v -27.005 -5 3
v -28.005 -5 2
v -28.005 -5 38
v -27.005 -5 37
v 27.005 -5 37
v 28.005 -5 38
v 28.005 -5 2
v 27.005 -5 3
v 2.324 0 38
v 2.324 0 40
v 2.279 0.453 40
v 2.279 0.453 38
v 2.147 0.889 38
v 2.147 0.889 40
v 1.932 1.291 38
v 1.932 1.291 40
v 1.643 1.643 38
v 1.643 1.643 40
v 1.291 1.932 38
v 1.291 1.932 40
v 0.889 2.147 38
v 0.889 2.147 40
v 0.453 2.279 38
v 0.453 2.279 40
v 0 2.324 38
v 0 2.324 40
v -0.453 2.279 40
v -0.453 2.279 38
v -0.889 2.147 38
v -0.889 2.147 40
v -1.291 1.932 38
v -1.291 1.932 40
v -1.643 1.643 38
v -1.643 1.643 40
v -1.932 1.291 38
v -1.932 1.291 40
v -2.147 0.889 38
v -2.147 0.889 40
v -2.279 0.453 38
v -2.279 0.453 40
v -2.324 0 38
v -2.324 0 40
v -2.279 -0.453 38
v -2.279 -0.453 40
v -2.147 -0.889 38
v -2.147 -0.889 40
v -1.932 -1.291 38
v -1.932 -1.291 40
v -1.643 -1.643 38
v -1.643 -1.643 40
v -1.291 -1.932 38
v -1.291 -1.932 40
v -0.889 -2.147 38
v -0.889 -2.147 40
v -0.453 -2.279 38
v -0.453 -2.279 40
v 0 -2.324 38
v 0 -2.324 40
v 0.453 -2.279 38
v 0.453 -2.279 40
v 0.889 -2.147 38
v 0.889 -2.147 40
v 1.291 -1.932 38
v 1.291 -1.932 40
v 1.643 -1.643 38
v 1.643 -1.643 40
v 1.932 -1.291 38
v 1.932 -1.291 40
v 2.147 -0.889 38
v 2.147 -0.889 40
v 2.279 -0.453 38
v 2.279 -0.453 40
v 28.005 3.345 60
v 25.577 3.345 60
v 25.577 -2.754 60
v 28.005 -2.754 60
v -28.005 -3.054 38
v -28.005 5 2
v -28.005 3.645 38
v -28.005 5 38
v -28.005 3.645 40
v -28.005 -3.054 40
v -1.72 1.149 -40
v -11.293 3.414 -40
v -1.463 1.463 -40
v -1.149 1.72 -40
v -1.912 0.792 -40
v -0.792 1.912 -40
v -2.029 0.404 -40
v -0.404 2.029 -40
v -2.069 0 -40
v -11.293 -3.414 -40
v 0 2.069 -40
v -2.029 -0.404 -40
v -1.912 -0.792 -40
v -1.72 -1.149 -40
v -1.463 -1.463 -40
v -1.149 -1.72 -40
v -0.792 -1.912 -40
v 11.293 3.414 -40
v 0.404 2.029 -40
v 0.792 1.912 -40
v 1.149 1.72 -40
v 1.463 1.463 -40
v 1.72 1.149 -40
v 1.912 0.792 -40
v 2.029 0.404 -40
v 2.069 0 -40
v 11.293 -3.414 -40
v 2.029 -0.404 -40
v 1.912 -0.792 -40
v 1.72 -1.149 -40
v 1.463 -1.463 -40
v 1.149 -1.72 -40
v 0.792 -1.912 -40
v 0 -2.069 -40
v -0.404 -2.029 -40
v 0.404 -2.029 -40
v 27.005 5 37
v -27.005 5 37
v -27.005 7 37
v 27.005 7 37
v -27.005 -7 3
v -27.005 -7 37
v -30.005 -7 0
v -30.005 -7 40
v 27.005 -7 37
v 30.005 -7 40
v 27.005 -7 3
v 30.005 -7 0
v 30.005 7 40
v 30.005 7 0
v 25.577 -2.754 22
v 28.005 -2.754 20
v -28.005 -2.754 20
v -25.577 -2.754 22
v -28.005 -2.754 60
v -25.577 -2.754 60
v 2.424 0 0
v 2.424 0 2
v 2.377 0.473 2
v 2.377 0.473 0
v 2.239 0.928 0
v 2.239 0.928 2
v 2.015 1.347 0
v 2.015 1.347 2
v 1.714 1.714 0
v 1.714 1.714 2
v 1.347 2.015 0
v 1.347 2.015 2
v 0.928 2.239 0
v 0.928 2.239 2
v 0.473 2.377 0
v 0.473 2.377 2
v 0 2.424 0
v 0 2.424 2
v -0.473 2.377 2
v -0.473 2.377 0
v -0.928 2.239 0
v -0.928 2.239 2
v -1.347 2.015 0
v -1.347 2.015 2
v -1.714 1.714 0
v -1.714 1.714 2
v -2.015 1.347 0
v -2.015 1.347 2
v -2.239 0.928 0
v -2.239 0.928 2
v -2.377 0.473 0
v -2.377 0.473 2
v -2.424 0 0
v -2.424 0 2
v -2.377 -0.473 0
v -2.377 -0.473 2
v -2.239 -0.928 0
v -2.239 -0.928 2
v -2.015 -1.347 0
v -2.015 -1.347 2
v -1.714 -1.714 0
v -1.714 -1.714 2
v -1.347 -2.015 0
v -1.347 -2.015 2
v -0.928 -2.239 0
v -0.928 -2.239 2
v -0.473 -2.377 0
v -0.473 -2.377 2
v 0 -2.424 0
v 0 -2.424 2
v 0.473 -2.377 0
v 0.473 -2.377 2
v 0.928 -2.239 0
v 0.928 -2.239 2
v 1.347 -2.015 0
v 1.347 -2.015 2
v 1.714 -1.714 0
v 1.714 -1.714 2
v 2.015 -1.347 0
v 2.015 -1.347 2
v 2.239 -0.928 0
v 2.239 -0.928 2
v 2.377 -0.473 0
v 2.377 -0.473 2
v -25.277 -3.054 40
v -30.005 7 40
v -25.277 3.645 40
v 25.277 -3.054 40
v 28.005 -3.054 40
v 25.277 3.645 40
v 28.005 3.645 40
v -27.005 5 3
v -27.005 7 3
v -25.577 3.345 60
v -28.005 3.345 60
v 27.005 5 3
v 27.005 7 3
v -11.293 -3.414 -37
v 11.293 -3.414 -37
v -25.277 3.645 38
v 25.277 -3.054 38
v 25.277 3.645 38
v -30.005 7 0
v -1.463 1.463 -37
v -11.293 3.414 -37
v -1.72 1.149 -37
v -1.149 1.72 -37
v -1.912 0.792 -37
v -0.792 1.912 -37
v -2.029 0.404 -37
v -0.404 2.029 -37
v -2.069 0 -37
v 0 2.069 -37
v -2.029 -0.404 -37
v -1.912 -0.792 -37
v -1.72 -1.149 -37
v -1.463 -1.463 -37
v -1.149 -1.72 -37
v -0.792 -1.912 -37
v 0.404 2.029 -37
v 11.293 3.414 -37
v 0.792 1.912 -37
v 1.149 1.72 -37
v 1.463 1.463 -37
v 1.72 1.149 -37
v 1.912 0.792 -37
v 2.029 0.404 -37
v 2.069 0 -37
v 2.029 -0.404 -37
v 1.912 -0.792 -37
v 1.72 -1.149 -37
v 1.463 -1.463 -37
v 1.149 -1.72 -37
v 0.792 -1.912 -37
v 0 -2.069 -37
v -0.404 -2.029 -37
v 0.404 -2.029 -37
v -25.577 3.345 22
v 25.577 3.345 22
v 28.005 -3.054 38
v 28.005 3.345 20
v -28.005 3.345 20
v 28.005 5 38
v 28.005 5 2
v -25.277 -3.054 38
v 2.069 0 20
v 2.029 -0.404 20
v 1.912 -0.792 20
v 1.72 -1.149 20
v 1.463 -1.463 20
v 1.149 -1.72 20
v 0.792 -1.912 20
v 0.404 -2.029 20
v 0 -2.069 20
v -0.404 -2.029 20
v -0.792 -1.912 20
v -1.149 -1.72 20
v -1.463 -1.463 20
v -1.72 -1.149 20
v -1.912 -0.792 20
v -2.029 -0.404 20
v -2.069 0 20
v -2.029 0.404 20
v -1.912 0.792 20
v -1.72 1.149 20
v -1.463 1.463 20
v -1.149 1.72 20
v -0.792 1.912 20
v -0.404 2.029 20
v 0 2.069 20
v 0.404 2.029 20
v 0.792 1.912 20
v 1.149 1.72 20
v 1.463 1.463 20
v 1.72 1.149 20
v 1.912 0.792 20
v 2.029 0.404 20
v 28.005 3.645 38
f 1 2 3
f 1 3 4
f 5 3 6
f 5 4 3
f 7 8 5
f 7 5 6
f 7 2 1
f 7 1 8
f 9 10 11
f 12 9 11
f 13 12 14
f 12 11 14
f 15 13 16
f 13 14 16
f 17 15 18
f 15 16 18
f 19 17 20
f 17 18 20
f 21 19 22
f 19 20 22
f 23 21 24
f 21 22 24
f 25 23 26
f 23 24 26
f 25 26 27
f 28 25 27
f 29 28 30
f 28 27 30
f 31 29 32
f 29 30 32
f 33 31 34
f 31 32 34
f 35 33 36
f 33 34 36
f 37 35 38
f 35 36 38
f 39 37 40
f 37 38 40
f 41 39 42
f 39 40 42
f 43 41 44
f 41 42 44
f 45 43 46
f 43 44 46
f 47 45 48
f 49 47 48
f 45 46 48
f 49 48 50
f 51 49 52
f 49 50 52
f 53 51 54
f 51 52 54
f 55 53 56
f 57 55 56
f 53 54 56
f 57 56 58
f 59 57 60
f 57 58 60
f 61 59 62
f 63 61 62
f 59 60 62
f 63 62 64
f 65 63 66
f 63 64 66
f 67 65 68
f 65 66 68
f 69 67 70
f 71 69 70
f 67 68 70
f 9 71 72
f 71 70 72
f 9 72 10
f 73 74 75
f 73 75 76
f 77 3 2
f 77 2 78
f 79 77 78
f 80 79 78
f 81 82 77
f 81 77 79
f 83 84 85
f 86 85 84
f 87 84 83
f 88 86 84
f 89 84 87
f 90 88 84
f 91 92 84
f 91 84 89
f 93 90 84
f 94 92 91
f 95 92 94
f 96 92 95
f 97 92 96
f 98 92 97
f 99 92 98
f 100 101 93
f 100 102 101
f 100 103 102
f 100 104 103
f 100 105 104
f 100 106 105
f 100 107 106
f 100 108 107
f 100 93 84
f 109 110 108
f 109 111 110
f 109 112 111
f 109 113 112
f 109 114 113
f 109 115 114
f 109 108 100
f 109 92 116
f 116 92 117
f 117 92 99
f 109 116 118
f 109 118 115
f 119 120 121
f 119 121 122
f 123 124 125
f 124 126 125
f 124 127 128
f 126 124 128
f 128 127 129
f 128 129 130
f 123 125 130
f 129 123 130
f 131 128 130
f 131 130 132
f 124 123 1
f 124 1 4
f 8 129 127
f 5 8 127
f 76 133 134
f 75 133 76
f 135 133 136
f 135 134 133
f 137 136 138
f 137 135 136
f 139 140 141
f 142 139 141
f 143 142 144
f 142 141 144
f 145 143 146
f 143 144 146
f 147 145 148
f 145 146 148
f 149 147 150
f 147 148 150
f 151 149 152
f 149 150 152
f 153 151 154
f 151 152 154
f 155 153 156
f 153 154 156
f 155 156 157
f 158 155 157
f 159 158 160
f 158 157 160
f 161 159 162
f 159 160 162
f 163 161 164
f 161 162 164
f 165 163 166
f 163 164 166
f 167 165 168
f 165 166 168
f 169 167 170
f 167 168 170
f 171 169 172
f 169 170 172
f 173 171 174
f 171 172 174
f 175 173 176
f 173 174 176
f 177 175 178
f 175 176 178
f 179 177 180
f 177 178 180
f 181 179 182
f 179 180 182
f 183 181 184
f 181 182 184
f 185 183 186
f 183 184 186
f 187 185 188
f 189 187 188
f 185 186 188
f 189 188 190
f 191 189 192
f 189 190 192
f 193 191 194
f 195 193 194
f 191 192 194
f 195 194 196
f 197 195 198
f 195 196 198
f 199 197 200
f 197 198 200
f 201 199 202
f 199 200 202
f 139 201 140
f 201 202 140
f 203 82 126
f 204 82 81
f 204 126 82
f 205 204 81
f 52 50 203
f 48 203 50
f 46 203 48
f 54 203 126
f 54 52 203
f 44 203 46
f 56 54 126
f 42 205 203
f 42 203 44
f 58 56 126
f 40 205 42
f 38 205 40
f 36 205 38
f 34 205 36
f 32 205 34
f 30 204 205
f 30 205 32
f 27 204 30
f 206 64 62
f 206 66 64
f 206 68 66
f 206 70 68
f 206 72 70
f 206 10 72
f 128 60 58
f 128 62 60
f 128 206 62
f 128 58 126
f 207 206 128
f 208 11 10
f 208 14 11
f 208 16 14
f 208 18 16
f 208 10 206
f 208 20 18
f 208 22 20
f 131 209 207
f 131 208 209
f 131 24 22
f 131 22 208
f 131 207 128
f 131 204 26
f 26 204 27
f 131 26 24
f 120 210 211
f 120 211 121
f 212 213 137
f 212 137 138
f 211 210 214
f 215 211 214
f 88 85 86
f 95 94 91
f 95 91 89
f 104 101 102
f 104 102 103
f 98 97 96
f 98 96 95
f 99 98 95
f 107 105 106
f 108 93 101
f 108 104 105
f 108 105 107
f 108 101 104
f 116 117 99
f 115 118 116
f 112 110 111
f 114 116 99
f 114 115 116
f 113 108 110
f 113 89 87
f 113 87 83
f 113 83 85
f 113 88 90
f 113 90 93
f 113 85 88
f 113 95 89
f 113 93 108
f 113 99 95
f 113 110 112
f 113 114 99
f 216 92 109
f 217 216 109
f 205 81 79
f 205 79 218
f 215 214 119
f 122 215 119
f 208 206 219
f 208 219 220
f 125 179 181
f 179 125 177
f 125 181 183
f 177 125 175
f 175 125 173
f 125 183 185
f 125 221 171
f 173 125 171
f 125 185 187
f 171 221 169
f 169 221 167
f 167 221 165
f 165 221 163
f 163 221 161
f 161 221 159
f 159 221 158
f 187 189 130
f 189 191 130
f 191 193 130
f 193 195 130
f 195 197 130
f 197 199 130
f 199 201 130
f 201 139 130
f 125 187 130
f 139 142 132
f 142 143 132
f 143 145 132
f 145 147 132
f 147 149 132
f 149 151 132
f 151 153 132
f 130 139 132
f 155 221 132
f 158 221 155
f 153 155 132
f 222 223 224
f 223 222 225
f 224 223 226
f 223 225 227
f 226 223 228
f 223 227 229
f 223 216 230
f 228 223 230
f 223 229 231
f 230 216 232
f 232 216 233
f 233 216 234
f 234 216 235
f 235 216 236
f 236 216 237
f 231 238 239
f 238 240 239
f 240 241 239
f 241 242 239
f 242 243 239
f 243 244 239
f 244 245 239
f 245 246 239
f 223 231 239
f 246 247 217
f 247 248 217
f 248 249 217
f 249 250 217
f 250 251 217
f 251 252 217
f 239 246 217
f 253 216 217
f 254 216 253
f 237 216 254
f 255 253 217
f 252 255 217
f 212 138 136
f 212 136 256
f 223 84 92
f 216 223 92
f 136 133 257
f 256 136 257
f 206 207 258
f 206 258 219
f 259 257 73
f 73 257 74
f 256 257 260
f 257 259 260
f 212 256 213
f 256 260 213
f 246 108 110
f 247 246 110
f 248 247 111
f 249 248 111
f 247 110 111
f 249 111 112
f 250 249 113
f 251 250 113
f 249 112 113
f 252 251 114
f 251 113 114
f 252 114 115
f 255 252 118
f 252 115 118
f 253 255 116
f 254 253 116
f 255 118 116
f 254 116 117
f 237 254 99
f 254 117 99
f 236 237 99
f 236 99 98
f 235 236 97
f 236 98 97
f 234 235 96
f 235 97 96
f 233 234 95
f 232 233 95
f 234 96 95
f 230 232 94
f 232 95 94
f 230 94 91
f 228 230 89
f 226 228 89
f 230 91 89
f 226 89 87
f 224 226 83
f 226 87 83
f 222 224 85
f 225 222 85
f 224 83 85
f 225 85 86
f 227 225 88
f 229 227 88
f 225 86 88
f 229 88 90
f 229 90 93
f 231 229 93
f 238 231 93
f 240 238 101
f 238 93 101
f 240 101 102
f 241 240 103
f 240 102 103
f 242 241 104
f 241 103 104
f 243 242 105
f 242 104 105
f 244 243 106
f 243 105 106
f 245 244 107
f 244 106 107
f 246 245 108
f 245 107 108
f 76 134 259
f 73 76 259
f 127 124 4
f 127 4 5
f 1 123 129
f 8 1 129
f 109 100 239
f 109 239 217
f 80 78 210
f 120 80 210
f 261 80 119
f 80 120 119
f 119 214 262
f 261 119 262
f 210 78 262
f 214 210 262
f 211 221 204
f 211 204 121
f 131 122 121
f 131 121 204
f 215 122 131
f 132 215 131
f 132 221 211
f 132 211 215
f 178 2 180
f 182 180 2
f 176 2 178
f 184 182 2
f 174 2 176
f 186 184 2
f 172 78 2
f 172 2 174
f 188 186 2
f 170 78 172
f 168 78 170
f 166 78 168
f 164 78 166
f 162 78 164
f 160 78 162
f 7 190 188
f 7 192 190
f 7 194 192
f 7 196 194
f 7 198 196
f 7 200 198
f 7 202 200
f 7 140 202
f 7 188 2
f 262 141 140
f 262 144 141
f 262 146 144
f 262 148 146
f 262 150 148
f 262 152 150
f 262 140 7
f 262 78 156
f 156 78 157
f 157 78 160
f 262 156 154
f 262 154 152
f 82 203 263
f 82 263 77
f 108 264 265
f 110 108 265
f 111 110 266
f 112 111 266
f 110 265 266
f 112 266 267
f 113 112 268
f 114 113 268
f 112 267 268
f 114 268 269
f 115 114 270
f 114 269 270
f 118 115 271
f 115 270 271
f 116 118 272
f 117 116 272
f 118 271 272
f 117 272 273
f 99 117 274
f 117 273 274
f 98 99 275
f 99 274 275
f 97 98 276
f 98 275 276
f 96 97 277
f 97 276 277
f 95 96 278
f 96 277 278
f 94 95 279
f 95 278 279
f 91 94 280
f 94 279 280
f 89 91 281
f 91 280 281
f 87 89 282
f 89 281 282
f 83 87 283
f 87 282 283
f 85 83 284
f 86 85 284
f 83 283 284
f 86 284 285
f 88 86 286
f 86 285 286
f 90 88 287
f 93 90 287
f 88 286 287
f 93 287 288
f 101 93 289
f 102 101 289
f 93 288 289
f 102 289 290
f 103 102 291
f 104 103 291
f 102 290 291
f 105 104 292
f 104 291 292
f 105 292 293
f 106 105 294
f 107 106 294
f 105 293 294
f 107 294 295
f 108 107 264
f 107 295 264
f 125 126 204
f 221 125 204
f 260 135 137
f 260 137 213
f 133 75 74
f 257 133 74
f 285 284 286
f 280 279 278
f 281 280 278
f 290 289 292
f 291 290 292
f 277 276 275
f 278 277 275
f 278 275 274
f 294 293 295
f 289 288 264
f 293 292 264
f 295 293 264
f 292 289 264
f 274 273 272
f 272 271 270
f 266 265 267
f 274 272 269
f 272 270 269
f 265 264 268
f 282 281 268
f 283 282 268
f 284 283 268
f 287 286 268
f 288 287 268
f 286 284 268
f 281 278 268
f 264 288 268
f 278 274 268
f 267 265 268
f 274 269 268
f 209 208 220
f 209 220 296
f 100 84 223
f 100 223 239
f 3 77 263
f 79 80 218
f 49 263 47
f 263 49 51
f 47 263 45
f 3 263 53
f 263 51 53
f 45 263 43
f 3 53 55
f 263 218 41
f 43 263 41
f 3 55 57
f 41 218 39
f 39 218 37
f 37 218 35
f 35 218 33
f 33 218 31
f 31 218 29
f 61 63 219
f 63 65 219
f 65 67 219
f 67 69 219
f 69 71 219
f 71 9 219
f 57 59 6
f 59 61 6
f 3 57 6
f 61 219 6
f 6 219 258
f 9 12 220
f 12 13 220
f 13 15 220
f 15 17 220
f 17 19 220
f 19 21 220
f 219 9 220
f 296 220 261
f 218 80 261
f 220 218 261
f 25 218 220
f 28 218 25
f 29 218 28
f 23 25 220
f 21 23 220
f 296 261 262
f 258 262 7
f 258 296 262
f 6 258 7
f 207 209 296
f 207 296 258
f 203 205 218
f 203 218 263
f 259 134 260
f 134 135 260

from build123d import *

# Parameters (mm, degrees)
F0_W      = 60.0096508861
F0_H      = 14
F0_W_2    = 56.0096508861
F0_H_2    = 10
F0_W_3    = 54.0096508861
F0_H_3    = 8
F0_W_4    = 17.1252988726
F0_H_4    = 5
F1_DEPTH  = 2
F2_DEPTH  = 40
F3_W      = 54.0096508861
F3_H      = 34
F4_DEPTH  = 25
F5_W      = 22.0086090267
F5_H      = 9.8841609433
F5_W_2    = 17.1252988726
F5_H_2    = 5
F5_R      = 2.4237379835
F6_DEPTH  = 2
F7_W      = 60.0096508861
F7_H      = 14
F7_R      = 2.3237379835
F8_DEPTH  = 2
F7_W_2    = 2.4276788831
F7_H_2    = 6.0991658829
F9_DEPTH  = 20
F10_W     = 6.0991658829
F10_H     = 2
F11_DEPTH = 51.1542931199
F12_R     = 2.069
F13_DEPTH = 60
F14_W     = 22.5858446211
F14_H     = 6.8282815628
F14_R     = 2.069
F15_DEPTH = 3


with BuildPart() as f1:
    # F0 (on Top) → F1 (new body)
    with BuildSketch(Plane.XY):
        Rectangle(F0_W, F0_H)
        Rectangle(F0_W_2, F0_H_2, mode=Mode.SUBTRACT)
        Rectangle(F0_W_2, F0_H_2)
        Rectangle(F0_W_3, F0_H_3, mode=Mode.SUBTRACT)
        Rectangle(F0_W_3, F0_H_3)
        Rectangle(F0_W_4, F0_H_4, mode=Mode.SUBTRACT)
    extrude(amount=F1_DEPTH)

    # F0 (on Top) → F2 (join)
    with BuildSketch(Plane.XY):
        Rectangle(F0_W, F0_H)
        Rectangle(F0_W_2, F0_H_2, mode=Mode.SUBTRACT)
    extrude(amount=F2_DEPTH)

    # F3 (on face) → F4 (cut)
    with BuildSketch(Plane.XZ.offset(7)):
        with Locations((0, 20)):
            Rectangle(F3_W, F3_H)
    extrude(amount=-F4_DEPTH, mode=Mode.SUBTRACT)

    # F5 (on face) → F6 (join)
    with BuildSketch(Plane.XY.offset(2)):
        Rectangle(F5_W, F5_H)
        Rectangle(F5_W_2, F5_H_2, mode=Mode.SUBTRACT)
        Rectangle(F5_W_2, F5_H_2)
        Circle(F5_R, mode=Mode.SUBTRACT)
    extrude(amount=-F6_DEPTH)

    # F7 (on face) → F8 (join)
    with BuildSketch(Plane.XY.offset(40)):
        Rectangle(F7_W, F7_H)
        Polygon((28.004825443, 3.644704397), (28.004825443, 3.344704397), (28.004825443, -2.7544614859), (28.004825443, -3.0544614859), (28.004825443, -5), (-28.004825443, -5), (-28.004825443, -3.0544614859), (-28.004825443, -2.7544614859), (-28.004825443, 3.344704397), (-28.004825443, 3.644704397), (-28.004825443, 5), (28.004825443, 5), align=None, mode=Mode.SUBTRACT)
        Polygon((25.27714656, 3.644704397), (28.004825443, 3.644704397), (28.004825443, 5), (-28.004825443, 5), (-28.004825443, 3.644704397), (-25.27714656, 3.644704397), (-25.27714656, -3.0544614859), (-28.004825443, -3.0544614859), (-28.004825443, -5), (28.004825443, -5), (28.004825443, -3.0544614859), (25.27714656, -3.0544614859), align=None)
        Circle(F7_R, mode=Mode.SUBTRACT)
    extrude(amount=-F8_DEPTH)


with BuildPart() as f9:
    # F7 (on face) → F9 (new body, symmetric)
    with BuildSketch(Plane.XY.offset(40)):
        with Locations((26.7909860015, 0.2951214556)):
            Rectangle(F7_W_2, F7_H_2)
    extrude(amount=F9_DEPTH, both=True)



with BuildPart() as f9b:
    # F7 (on face) → F9, piece 2 (new body, symmetric)
    with BuildSketch(Plane.XY.offset(40)):
        with Locations((-26.7909860015, 0.2951214556)):
            Rectangle(F7_W_2, F7_H_2)
    extrude(amount=F9_DEPTH, both=True)


with BuildPart() as f9_1:
    add(f9.part)

    add(f9b.part)  # F11 merges F9b
    # F10 (on face) → F11 (join, through all)
    with BuildSketch(Plane.YZ.offset(-25.57714656)):
        with Locations((0.2951214556, 21)):
            Rectangle(F10_W, F10_H)
    extrude(amount=F11_DEPTH)


with BuildPart() as f13:
    # F12 (on face) → F13 (new body)
    with BuildSketch(Plane(origin=(0, 0, 20), x_dir=(1, 0, 0), z_dir=(0, 0, -1))):
        Circle(F12_R)
    extrude(amount=F13_DEPTH)


with BuildPart() as f15:
    # F14 (on face) → F15 (new body)
    with BuildSketch(Plane(origin=(0, 0, -40), x_dir=(1, 0, 0), z_dir=(0, 0, -1))):
        Rectangle(F14_W, F14_H)
        Circle(F14_R, mode=Mode.SUBTRACT)
    extrude(amount=-F15_DEPTH)


solid = Compound([f1.part, f9_1.part, f13.part, f15.part])
